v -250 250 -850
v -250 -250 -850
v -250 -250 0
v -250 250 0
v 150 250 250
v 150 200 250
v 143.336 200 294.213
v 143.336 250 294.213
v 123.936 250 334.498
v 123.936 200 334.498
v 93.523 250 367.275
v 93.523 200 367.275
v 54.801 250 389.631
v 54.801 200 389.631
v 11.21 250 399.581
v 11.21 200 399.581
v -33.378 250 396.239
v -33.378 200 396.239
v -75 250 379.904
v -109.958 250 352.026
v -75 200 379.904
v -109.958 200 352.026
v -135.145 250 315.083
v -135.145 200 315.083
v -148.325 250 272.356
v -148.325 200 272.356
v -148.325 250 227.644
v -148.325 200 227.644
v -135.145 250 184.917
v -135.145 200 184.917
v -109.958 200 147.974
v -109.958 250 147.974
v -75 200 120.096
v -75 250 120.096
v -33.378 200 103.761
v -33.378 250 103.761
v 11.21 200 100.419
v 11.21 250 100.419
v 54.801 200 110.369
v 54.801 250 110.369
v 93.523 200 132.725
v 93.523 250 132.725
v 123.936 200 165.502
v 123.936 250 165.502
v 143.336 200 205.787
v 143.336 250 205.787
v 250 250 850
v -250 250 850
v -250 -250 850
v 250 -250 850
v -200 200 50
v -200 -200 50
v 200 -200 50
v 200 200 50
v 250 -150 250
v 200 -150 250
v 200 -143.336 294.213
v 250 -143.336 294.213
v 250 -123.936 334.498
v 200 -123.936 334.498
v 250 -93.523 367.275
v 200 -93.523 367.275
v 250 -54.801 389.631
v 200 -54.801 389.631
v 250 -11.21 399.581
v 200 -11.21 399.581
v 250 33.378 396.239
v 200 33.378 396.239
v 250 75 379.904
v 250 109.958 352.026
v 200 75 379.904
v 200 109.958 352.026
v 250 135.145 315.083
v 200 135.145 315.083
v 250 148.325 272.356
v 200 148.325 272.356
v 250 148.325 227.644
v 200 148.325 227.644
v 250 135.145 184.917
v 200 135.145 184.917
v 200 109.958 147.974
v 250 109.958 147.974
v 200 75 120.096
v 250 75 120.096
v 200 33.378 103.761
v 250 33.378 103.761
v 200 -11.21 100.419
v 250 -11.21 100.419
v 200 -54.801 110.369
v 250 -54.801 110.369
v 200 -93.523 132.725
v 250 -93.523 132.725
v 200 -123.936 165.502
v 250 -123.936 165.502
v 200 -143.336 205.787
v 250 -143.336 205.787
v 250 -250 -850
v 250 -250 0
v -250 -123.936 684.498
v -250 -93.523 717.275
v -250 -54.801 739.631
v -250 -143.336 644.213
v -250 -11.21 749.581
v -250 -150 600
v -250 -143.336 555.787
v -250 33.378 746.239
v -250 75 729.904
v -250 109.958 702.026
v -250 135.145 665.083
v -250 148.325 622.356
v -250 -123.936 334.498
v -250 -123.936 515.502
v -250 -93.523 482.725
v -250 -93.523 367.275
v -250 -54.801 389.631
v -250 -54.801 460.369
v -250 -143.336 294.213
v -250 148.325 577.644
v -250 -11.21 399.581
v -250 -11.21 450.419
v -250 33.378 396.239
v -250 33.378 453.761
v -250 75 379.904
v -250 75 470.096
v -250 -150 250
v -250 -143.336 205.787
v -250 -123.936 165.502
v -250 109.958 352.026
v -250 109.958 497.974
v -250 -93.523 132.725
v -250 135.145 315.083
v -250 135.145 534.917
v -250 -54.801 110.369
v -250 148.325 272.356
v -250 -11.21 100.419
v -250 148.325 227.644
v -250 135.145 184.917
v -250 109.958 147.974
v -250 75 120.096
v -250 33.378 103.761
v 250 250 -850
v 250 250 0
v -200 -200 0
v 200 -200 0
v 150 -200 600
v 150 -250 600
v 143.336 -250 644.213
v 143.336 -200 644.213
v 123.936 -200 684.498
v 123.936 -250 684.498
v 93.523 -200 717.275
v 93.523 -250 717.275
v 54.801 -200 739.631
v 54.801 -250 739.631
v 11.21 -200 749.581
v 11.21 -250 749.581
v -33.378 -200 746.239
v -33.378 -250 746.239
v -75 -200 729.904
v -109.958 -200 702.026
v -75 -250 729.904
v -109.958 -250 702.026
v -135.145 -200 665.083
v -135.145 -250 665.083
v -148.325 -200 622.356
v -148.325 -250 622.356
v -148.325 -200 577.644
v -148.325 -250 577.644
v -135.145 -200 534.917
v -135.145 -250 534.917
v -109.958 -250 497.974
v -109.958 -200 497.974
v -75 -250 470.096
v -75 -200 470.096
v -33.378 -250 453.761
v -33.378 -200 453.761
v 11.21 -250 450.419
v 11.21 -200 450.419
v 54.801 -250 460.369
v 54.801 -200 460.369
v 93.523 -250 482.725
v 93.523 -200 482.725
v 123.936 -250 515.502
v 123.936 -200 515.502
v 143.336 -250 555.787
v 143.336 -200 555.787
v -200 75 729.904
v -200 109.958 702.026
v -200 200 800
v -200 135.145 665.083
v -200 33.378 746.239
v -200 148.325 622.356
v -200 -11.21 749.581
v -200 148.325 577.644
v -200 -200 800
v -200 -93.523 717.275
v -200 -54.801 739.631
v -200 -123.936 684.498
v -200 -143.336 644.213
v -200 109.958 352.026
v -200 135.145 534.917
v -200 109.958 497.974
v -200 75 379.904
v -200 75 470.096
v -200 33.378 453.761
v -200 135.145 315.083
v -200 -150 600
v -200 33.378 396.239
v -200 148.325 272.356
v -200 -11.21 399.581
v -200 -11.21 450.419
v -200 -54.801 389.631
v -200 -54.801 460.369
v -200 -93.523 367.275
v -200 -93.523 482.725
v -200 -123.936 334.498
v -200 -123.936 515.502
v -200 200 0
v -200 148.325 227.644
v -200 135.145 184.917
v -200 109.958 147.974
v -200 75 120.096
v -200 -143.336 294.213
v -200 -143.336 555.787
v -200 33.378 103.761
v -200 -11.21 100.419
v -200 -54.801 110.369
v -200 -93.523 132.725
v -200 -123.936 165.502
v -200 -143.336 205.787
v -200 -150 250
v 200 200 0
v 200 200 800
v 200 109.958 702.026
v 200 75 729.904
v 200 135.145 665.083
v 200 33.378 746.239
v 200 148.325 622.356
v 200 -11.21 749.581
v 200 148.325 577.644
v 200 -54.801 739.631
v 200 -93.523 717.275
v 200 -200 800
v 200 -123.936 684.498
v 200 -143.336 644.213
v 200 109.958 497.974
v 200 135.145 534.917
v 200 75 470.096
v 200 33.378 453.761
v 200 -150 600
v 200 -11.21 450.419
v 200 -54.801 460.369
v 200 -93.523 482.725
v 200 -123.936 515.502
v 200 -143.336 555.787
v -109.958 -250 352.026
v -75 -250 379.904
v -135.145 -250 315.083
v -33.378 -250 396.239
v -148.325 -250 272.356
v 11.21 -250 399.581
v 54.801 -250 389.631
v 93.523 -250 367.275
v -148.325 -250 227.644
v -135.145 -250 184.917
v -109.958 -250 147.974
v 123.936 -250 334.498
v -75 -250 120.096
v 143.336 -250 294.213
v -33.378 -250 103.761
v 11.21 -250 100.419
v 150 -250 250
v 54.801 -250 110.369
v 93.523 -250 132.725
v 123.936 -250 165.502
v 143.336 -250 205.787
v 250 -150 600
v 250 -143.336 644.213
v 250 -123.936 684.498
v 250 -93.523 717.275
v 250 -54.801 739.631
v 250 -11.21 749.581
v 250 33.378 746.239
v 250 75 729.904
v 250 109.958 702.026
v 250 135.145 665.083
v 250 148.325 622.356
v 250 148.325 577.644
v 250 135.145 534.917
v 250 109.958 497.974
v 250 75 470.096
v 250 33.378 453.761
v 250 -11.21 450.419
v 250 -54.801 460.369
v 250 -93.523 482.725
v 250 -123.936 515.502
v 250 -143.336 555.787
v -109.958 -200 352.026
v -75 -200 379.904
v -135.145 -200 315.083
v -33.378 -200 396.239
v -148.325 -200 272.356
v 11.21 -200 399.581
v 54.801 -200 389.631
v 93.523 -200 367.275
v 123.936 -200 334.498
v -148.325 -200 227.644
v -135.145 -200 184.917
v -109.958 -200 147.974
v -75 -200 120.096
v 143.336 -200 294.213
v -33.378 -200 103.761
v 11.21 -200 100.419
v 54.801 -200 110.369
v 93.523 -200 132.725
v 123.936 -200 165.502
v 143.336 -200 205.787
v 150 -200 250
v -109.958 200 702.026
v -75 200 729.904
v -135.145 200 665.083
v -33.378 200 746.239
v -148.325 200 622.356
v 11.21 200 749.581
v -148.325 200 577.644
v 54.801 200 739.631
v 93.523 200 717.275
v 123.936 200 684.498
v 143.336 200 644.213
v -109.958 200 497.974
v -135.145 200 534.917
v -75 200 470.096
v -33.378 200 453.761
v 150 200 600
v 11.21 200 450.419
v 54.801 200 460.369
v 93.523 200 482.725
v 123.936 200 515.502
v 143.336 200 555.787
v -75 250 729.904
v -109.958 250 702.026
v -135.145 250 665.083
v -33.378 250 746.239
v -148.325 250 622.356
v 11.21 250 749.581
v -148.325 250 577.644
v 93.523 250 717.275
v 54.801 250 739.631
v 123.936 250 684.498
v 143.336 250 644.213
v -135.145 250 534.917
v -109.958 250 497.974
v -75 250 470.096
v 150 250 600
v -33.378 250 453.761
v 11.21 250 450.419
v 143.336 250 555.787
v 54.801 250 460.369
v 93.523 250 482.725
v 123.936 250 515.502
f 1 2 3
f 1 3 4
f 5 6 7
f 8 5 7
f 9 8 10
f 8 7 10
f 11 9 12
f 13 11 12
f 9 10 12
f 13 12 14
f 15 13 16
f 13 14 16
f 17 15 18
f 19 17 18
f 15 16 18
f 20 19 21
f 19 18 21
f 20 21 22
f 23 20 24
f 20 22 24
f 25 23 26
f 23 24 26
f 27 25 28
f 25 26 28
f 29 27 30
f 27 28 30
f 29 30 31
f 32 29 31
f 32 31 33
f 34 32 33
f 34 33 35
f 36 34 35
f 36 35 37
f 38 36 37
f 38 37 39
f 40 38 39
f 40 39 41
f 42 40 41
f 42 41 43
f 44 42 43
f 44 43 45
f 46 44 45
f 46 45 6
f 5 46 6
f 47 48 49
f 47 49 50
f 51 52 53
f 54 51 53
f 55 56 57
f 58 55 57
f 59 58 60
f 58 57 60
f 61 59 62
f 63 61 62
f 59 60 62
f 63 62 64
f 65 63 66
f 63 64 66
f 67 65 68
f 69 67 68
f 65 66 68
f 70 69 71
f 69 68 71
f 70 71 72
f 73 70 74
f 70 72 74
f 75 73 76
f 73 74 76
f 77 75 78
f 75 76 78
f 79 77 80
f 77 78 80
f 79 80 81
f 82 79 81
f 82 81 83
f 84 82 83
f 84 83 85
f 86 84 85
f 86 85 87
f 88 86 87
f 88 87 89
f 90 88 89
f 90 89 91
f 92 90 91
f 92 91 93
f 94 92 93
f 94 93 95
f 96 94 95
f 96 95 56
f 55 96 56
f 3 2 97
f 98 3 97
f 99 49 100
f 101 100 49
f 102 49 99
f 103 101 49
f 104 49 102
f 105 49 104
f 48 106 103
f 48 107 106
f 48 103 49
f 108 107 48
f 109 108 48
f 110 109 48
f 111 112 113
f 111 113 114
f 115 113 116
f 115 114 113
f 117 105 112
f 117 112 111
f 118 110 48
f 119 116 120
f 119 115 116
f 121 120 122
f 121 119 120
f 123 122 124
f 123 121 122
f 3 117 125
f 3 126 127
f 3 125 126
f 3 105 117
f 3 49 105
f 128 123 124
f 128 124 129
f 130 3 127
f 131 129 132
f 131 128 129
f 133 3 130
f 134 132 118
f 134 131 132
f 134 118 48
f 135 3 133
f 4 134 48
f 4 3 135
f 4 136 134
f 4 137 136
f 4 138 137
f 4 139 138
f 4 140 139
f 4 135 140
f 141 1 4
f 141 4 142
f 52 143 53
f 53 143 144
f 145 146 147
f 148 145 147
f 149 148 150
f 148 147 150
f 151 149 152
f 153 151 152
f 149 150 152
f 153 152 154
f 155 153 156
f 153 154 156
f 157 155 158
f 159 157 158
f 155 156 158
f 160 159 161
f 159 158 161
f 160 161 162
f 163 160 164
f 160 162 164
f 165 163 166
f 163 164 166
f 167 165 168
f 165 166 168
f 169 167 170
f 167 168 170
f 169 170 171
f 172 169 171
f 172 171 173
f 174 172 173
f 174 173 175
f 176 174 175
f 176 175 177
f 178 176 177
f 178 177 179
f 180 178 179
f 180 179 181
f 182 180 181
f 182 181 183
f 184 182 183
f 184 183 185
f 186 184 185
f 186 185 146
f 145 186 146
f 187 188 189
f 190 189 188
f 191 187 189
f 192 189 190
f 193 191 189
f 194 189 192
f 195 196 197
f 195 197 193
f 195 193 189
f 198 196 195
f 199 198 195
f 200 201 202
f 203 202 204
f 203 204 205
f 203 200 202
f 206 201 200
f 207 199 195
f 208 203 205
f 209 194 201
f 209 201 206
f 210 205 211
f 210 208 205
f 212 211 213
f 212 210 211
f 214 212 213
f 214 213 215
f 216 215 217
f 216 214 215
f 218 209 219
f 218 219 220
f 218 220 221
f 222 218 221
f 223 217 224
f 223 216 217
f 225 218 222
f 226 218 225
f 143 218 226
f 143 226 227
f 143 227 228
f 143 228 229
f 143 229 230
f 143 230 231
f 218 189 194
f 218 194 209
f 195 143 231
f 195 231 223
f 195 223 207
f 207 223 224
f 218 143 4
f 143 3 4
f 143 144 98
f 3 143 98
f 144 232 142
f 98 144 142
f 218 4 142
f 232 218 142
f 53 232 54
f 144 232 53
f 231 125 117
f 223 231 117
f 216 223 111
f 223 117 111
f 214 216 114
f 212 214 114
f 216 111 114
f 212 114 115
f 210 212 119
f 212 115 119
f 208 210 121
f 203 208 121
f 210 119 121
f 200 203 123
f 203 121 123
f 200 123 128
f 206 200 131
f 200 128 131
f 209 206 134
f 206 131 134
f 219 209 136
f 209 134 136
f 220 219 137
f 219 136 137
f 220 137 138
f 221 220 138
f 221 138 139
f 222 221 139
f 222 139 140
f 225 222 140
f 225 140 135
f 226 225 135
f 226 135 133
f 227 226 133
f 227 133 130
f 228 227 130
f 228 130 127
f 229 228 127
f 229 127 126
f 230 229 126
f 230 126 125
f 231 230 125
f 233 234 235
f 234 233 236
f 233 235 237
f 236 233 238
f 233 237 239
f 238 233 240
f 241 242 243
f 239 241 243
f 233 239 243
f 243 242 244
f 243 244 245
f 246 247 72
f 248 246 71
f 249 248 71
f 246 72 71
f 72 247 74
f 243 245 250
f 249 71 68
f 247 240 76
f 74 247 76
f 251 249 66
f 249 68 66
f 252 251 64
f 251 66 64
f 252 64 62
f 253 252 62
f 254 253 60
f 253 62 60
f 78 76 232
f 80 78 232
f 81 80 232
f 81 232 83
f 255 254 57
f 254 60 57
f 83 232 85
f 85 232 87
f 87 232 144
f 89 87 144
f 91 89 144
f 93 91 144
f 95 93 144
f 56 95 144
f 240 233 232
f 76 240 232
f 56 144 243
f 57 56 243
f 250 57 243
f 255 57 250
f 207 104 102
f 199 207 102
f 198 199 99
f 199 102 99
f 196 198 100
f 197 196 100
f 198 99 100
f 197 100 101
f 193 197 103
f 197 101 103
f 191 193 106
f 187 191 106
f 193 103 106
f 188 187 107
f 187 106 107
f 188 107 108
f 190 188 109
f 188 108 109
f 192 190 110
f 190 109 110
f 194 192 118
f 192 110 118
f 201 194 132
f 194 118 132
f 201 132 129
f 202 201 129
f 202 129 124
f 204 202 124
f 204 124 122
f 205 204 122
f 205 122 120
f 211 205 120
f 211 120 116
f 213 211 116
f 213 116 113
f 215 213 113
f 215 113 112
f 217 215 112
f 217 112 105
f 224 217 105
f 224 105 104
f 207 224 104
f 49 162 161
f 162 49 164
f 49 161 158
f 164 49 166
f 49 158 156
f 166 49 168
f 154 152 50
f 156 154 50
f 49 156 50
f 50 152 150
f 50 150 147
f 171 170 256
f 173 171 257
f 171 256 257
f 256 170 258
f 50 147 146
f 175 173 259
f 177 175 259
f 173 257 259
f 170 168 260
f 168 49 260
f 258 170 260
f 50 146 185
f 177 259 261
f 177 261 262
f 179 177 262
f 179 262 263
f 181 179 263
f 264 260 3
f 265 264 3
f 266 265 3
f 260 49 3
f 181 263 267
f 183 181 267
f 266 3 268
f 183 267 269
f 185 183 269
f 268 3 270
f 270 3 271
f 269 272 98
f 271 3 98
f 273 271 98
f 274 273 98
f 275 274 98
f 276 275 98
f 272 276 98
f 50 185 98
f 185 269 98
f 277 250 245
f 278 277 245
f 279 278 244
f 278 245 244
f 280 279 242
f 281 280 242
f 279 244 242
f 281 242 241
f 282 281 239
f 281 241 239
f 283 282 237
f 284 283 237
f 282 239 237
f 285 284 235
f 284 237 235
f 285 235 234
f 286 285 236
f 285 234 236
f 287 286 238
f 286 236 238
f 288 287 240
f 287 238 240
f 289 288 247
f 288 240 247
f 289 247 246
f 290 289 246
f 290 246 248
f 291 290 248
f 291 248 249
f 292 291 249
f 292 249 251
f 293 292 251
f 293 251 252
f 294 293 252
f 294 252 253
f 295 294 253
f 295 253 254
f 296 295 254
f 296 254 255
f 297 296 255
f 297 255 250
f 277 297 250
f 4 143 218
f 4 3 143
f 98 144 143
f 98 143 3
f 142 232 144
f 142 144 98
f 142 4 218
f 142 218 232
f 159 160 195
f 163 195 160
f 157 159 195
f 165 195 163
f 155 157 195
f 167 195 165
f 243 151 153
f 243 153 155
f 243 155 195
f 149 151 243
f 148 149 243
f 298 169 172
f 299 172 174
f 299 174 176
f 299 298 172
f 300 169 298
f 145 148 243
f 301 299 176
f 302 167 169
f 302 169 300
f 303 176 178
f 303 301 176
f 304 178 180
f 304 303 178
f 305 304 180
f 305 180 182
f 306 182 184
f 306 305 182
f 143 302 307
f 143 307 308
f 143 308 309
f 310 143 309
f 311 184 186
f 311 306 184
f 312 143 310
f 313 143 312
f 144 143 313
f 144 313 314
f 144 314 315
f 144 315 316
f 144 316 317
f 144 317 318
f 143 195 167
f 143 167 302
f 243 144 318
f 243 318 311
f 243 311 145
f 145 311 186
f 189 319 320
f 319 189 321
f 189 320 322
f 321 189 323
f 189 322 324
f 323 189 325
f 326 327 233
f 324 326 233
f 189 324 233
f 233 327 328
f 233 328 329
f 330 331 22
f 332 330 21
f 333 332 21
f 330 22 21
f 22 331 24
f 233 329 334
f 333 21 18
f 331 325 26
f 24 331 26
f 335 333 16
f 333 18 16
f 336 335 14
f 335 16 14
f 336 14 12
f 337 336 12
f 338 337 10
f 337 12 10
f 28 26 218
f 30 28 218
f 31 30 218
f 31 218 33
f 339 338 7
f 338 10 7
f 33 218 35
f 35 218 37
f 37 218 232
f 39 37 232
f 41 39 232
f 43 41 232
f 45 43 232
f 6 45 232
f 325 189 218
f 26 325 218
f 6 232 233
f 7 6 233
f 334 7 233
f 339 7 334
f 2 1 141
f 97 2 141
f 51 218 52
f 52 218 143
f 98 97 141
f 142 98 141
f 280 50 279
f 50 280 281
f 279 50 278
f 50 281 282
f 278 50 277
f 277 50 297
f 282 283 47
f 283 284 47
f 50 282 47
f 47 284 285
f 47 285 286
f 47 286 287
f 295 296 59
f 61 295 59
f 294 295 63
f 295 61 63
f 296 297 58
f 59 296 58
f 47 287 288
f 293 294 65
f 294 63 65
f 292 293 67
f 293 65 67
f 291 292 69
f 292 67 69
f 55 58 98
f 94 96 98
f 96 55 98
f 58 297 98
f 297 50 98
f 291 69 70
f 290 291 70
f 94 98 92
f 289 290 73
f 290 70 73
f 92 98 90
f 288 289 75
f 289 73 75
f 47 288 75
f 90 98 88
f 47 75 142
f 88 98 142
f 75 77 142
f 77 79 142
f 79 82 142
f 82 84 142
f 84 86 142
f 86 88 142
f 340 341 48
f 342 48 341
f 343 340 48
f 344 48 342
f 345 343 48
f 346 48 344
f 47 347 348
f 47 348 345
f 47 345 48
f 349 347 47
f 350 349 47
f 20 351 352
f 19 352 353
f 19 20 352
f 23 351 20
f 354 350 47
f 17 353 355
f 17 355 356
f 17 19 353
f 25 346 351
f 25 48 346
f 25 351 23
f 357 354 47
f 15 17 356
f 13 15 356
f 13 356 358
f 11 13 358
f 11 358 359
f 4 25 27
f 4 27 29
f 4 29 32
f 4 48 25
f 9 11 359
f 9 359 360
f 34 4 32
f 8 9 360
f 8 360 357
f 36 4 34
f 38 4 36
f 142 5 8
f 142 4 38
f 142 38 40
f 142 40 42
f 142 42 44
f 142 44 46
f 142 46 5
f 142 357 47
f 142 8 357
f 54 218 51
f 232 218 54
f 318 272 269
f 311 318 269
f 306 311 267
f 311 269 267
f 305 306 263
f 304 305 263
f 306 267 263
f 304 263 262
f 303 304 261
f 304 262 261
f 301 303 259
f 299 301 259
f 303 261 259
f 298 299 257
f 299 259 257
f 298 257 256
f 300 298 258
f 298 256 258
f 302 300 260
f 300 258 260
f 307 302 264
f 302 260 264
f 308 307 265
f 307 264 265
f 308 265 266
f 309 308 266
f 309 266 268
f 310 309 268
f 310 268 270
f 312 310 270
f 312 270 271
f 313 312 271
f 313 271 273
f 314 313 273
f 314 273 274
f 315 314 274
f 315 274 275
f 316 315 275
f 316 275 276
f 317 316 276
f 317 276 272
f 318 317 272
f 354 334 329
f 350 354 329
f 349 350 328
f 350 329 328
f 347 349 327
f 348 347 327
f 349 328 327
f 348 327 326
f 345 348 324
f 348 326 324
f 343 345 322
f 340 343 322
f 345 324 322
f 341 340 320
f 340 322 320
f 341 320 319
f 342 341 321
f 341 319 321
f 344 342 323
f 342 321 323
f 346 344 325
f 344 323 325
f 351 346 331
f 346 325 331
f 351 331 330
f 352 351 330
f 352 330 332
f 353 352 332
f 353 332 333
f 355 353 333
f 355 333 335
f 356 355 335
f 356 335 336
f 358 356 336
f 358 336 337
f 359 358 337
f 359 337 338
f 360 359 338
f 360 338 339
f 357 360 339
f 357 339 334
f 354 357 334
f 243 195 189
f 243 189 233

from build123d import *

# Parameters (mm, degrees)
F0_W     = 500
F0_H     = 500
F1_DEPTH = 850
F2_R     = 150
F3_DEPTH = 500.001
F4_R     = 150
F5_DEPTH = 500.001
F6_W     = 400
F6_H     = 400
F7_DEPTH = 800
F8_DEPTH = 850
F9_DEPTH = 50


with BuildPart() as f1:
    # F0 (on Top) → F1 (new body)
    with BuildSketch(Plane.XY):
        Rectangle(F0_W, F0_H)
    extrude(amount=F1_DEPTH)

    # F2 (on face) → F3 (cut, through all)
    with BuildSketch(Plane.XZ.offset(250)):
        with Locations((0, 600)):
            Circle(F2_R)
        with Locations((0, 250)):
            Circle(F2_R)
    extrude(amount=-F3_DEPTH, mode=Mode.SUBTRACT)

    # F4 (on face) → F5 (cut, through all)
    with BuildSketch(Plane(origin=(-250, 0, 0), x_dir=(0, -1, 0), z_dir=(-1, 0, 0))):
        with Locations((0, 250)):
            Circle(F4_R)
        with Locations((0, 600)):
            Circle(F4_R)
    extrude(amount=-F5_DEPTH, mode=Mode.SUBTRACT)

    # F6 (on face) → F7 (cut)
    with BuildSketch(Plane(origin=(0, 0, 0), x_dir=(1, 0, 0), z_dir=(0, 0, -1))):
        Rectangle(F6_W, F6_H)
    extrude(amount=-F7_DEPTH, mode=Mode.SUBTRACT)


with BuildPart() as f8:
    # F0 (on Top) → F8 (new body)
    with BuildSketch(Plane.XY):
        Rectangle(F0_W, F0_H)
    extrude(amount=-F8_DEPTH)

    # F6 (on face) → F9 (join)
    with BuildSketch(Plane(origin=(0, 0, 0), x_dir=(1, 0, 0), z_dir=(0, 0, -1))):
        Rectangle(F6_W, F6_H)
    extrude(amount=-F9_DEPTH)


solid = Compound([f1.part, f8.part])
